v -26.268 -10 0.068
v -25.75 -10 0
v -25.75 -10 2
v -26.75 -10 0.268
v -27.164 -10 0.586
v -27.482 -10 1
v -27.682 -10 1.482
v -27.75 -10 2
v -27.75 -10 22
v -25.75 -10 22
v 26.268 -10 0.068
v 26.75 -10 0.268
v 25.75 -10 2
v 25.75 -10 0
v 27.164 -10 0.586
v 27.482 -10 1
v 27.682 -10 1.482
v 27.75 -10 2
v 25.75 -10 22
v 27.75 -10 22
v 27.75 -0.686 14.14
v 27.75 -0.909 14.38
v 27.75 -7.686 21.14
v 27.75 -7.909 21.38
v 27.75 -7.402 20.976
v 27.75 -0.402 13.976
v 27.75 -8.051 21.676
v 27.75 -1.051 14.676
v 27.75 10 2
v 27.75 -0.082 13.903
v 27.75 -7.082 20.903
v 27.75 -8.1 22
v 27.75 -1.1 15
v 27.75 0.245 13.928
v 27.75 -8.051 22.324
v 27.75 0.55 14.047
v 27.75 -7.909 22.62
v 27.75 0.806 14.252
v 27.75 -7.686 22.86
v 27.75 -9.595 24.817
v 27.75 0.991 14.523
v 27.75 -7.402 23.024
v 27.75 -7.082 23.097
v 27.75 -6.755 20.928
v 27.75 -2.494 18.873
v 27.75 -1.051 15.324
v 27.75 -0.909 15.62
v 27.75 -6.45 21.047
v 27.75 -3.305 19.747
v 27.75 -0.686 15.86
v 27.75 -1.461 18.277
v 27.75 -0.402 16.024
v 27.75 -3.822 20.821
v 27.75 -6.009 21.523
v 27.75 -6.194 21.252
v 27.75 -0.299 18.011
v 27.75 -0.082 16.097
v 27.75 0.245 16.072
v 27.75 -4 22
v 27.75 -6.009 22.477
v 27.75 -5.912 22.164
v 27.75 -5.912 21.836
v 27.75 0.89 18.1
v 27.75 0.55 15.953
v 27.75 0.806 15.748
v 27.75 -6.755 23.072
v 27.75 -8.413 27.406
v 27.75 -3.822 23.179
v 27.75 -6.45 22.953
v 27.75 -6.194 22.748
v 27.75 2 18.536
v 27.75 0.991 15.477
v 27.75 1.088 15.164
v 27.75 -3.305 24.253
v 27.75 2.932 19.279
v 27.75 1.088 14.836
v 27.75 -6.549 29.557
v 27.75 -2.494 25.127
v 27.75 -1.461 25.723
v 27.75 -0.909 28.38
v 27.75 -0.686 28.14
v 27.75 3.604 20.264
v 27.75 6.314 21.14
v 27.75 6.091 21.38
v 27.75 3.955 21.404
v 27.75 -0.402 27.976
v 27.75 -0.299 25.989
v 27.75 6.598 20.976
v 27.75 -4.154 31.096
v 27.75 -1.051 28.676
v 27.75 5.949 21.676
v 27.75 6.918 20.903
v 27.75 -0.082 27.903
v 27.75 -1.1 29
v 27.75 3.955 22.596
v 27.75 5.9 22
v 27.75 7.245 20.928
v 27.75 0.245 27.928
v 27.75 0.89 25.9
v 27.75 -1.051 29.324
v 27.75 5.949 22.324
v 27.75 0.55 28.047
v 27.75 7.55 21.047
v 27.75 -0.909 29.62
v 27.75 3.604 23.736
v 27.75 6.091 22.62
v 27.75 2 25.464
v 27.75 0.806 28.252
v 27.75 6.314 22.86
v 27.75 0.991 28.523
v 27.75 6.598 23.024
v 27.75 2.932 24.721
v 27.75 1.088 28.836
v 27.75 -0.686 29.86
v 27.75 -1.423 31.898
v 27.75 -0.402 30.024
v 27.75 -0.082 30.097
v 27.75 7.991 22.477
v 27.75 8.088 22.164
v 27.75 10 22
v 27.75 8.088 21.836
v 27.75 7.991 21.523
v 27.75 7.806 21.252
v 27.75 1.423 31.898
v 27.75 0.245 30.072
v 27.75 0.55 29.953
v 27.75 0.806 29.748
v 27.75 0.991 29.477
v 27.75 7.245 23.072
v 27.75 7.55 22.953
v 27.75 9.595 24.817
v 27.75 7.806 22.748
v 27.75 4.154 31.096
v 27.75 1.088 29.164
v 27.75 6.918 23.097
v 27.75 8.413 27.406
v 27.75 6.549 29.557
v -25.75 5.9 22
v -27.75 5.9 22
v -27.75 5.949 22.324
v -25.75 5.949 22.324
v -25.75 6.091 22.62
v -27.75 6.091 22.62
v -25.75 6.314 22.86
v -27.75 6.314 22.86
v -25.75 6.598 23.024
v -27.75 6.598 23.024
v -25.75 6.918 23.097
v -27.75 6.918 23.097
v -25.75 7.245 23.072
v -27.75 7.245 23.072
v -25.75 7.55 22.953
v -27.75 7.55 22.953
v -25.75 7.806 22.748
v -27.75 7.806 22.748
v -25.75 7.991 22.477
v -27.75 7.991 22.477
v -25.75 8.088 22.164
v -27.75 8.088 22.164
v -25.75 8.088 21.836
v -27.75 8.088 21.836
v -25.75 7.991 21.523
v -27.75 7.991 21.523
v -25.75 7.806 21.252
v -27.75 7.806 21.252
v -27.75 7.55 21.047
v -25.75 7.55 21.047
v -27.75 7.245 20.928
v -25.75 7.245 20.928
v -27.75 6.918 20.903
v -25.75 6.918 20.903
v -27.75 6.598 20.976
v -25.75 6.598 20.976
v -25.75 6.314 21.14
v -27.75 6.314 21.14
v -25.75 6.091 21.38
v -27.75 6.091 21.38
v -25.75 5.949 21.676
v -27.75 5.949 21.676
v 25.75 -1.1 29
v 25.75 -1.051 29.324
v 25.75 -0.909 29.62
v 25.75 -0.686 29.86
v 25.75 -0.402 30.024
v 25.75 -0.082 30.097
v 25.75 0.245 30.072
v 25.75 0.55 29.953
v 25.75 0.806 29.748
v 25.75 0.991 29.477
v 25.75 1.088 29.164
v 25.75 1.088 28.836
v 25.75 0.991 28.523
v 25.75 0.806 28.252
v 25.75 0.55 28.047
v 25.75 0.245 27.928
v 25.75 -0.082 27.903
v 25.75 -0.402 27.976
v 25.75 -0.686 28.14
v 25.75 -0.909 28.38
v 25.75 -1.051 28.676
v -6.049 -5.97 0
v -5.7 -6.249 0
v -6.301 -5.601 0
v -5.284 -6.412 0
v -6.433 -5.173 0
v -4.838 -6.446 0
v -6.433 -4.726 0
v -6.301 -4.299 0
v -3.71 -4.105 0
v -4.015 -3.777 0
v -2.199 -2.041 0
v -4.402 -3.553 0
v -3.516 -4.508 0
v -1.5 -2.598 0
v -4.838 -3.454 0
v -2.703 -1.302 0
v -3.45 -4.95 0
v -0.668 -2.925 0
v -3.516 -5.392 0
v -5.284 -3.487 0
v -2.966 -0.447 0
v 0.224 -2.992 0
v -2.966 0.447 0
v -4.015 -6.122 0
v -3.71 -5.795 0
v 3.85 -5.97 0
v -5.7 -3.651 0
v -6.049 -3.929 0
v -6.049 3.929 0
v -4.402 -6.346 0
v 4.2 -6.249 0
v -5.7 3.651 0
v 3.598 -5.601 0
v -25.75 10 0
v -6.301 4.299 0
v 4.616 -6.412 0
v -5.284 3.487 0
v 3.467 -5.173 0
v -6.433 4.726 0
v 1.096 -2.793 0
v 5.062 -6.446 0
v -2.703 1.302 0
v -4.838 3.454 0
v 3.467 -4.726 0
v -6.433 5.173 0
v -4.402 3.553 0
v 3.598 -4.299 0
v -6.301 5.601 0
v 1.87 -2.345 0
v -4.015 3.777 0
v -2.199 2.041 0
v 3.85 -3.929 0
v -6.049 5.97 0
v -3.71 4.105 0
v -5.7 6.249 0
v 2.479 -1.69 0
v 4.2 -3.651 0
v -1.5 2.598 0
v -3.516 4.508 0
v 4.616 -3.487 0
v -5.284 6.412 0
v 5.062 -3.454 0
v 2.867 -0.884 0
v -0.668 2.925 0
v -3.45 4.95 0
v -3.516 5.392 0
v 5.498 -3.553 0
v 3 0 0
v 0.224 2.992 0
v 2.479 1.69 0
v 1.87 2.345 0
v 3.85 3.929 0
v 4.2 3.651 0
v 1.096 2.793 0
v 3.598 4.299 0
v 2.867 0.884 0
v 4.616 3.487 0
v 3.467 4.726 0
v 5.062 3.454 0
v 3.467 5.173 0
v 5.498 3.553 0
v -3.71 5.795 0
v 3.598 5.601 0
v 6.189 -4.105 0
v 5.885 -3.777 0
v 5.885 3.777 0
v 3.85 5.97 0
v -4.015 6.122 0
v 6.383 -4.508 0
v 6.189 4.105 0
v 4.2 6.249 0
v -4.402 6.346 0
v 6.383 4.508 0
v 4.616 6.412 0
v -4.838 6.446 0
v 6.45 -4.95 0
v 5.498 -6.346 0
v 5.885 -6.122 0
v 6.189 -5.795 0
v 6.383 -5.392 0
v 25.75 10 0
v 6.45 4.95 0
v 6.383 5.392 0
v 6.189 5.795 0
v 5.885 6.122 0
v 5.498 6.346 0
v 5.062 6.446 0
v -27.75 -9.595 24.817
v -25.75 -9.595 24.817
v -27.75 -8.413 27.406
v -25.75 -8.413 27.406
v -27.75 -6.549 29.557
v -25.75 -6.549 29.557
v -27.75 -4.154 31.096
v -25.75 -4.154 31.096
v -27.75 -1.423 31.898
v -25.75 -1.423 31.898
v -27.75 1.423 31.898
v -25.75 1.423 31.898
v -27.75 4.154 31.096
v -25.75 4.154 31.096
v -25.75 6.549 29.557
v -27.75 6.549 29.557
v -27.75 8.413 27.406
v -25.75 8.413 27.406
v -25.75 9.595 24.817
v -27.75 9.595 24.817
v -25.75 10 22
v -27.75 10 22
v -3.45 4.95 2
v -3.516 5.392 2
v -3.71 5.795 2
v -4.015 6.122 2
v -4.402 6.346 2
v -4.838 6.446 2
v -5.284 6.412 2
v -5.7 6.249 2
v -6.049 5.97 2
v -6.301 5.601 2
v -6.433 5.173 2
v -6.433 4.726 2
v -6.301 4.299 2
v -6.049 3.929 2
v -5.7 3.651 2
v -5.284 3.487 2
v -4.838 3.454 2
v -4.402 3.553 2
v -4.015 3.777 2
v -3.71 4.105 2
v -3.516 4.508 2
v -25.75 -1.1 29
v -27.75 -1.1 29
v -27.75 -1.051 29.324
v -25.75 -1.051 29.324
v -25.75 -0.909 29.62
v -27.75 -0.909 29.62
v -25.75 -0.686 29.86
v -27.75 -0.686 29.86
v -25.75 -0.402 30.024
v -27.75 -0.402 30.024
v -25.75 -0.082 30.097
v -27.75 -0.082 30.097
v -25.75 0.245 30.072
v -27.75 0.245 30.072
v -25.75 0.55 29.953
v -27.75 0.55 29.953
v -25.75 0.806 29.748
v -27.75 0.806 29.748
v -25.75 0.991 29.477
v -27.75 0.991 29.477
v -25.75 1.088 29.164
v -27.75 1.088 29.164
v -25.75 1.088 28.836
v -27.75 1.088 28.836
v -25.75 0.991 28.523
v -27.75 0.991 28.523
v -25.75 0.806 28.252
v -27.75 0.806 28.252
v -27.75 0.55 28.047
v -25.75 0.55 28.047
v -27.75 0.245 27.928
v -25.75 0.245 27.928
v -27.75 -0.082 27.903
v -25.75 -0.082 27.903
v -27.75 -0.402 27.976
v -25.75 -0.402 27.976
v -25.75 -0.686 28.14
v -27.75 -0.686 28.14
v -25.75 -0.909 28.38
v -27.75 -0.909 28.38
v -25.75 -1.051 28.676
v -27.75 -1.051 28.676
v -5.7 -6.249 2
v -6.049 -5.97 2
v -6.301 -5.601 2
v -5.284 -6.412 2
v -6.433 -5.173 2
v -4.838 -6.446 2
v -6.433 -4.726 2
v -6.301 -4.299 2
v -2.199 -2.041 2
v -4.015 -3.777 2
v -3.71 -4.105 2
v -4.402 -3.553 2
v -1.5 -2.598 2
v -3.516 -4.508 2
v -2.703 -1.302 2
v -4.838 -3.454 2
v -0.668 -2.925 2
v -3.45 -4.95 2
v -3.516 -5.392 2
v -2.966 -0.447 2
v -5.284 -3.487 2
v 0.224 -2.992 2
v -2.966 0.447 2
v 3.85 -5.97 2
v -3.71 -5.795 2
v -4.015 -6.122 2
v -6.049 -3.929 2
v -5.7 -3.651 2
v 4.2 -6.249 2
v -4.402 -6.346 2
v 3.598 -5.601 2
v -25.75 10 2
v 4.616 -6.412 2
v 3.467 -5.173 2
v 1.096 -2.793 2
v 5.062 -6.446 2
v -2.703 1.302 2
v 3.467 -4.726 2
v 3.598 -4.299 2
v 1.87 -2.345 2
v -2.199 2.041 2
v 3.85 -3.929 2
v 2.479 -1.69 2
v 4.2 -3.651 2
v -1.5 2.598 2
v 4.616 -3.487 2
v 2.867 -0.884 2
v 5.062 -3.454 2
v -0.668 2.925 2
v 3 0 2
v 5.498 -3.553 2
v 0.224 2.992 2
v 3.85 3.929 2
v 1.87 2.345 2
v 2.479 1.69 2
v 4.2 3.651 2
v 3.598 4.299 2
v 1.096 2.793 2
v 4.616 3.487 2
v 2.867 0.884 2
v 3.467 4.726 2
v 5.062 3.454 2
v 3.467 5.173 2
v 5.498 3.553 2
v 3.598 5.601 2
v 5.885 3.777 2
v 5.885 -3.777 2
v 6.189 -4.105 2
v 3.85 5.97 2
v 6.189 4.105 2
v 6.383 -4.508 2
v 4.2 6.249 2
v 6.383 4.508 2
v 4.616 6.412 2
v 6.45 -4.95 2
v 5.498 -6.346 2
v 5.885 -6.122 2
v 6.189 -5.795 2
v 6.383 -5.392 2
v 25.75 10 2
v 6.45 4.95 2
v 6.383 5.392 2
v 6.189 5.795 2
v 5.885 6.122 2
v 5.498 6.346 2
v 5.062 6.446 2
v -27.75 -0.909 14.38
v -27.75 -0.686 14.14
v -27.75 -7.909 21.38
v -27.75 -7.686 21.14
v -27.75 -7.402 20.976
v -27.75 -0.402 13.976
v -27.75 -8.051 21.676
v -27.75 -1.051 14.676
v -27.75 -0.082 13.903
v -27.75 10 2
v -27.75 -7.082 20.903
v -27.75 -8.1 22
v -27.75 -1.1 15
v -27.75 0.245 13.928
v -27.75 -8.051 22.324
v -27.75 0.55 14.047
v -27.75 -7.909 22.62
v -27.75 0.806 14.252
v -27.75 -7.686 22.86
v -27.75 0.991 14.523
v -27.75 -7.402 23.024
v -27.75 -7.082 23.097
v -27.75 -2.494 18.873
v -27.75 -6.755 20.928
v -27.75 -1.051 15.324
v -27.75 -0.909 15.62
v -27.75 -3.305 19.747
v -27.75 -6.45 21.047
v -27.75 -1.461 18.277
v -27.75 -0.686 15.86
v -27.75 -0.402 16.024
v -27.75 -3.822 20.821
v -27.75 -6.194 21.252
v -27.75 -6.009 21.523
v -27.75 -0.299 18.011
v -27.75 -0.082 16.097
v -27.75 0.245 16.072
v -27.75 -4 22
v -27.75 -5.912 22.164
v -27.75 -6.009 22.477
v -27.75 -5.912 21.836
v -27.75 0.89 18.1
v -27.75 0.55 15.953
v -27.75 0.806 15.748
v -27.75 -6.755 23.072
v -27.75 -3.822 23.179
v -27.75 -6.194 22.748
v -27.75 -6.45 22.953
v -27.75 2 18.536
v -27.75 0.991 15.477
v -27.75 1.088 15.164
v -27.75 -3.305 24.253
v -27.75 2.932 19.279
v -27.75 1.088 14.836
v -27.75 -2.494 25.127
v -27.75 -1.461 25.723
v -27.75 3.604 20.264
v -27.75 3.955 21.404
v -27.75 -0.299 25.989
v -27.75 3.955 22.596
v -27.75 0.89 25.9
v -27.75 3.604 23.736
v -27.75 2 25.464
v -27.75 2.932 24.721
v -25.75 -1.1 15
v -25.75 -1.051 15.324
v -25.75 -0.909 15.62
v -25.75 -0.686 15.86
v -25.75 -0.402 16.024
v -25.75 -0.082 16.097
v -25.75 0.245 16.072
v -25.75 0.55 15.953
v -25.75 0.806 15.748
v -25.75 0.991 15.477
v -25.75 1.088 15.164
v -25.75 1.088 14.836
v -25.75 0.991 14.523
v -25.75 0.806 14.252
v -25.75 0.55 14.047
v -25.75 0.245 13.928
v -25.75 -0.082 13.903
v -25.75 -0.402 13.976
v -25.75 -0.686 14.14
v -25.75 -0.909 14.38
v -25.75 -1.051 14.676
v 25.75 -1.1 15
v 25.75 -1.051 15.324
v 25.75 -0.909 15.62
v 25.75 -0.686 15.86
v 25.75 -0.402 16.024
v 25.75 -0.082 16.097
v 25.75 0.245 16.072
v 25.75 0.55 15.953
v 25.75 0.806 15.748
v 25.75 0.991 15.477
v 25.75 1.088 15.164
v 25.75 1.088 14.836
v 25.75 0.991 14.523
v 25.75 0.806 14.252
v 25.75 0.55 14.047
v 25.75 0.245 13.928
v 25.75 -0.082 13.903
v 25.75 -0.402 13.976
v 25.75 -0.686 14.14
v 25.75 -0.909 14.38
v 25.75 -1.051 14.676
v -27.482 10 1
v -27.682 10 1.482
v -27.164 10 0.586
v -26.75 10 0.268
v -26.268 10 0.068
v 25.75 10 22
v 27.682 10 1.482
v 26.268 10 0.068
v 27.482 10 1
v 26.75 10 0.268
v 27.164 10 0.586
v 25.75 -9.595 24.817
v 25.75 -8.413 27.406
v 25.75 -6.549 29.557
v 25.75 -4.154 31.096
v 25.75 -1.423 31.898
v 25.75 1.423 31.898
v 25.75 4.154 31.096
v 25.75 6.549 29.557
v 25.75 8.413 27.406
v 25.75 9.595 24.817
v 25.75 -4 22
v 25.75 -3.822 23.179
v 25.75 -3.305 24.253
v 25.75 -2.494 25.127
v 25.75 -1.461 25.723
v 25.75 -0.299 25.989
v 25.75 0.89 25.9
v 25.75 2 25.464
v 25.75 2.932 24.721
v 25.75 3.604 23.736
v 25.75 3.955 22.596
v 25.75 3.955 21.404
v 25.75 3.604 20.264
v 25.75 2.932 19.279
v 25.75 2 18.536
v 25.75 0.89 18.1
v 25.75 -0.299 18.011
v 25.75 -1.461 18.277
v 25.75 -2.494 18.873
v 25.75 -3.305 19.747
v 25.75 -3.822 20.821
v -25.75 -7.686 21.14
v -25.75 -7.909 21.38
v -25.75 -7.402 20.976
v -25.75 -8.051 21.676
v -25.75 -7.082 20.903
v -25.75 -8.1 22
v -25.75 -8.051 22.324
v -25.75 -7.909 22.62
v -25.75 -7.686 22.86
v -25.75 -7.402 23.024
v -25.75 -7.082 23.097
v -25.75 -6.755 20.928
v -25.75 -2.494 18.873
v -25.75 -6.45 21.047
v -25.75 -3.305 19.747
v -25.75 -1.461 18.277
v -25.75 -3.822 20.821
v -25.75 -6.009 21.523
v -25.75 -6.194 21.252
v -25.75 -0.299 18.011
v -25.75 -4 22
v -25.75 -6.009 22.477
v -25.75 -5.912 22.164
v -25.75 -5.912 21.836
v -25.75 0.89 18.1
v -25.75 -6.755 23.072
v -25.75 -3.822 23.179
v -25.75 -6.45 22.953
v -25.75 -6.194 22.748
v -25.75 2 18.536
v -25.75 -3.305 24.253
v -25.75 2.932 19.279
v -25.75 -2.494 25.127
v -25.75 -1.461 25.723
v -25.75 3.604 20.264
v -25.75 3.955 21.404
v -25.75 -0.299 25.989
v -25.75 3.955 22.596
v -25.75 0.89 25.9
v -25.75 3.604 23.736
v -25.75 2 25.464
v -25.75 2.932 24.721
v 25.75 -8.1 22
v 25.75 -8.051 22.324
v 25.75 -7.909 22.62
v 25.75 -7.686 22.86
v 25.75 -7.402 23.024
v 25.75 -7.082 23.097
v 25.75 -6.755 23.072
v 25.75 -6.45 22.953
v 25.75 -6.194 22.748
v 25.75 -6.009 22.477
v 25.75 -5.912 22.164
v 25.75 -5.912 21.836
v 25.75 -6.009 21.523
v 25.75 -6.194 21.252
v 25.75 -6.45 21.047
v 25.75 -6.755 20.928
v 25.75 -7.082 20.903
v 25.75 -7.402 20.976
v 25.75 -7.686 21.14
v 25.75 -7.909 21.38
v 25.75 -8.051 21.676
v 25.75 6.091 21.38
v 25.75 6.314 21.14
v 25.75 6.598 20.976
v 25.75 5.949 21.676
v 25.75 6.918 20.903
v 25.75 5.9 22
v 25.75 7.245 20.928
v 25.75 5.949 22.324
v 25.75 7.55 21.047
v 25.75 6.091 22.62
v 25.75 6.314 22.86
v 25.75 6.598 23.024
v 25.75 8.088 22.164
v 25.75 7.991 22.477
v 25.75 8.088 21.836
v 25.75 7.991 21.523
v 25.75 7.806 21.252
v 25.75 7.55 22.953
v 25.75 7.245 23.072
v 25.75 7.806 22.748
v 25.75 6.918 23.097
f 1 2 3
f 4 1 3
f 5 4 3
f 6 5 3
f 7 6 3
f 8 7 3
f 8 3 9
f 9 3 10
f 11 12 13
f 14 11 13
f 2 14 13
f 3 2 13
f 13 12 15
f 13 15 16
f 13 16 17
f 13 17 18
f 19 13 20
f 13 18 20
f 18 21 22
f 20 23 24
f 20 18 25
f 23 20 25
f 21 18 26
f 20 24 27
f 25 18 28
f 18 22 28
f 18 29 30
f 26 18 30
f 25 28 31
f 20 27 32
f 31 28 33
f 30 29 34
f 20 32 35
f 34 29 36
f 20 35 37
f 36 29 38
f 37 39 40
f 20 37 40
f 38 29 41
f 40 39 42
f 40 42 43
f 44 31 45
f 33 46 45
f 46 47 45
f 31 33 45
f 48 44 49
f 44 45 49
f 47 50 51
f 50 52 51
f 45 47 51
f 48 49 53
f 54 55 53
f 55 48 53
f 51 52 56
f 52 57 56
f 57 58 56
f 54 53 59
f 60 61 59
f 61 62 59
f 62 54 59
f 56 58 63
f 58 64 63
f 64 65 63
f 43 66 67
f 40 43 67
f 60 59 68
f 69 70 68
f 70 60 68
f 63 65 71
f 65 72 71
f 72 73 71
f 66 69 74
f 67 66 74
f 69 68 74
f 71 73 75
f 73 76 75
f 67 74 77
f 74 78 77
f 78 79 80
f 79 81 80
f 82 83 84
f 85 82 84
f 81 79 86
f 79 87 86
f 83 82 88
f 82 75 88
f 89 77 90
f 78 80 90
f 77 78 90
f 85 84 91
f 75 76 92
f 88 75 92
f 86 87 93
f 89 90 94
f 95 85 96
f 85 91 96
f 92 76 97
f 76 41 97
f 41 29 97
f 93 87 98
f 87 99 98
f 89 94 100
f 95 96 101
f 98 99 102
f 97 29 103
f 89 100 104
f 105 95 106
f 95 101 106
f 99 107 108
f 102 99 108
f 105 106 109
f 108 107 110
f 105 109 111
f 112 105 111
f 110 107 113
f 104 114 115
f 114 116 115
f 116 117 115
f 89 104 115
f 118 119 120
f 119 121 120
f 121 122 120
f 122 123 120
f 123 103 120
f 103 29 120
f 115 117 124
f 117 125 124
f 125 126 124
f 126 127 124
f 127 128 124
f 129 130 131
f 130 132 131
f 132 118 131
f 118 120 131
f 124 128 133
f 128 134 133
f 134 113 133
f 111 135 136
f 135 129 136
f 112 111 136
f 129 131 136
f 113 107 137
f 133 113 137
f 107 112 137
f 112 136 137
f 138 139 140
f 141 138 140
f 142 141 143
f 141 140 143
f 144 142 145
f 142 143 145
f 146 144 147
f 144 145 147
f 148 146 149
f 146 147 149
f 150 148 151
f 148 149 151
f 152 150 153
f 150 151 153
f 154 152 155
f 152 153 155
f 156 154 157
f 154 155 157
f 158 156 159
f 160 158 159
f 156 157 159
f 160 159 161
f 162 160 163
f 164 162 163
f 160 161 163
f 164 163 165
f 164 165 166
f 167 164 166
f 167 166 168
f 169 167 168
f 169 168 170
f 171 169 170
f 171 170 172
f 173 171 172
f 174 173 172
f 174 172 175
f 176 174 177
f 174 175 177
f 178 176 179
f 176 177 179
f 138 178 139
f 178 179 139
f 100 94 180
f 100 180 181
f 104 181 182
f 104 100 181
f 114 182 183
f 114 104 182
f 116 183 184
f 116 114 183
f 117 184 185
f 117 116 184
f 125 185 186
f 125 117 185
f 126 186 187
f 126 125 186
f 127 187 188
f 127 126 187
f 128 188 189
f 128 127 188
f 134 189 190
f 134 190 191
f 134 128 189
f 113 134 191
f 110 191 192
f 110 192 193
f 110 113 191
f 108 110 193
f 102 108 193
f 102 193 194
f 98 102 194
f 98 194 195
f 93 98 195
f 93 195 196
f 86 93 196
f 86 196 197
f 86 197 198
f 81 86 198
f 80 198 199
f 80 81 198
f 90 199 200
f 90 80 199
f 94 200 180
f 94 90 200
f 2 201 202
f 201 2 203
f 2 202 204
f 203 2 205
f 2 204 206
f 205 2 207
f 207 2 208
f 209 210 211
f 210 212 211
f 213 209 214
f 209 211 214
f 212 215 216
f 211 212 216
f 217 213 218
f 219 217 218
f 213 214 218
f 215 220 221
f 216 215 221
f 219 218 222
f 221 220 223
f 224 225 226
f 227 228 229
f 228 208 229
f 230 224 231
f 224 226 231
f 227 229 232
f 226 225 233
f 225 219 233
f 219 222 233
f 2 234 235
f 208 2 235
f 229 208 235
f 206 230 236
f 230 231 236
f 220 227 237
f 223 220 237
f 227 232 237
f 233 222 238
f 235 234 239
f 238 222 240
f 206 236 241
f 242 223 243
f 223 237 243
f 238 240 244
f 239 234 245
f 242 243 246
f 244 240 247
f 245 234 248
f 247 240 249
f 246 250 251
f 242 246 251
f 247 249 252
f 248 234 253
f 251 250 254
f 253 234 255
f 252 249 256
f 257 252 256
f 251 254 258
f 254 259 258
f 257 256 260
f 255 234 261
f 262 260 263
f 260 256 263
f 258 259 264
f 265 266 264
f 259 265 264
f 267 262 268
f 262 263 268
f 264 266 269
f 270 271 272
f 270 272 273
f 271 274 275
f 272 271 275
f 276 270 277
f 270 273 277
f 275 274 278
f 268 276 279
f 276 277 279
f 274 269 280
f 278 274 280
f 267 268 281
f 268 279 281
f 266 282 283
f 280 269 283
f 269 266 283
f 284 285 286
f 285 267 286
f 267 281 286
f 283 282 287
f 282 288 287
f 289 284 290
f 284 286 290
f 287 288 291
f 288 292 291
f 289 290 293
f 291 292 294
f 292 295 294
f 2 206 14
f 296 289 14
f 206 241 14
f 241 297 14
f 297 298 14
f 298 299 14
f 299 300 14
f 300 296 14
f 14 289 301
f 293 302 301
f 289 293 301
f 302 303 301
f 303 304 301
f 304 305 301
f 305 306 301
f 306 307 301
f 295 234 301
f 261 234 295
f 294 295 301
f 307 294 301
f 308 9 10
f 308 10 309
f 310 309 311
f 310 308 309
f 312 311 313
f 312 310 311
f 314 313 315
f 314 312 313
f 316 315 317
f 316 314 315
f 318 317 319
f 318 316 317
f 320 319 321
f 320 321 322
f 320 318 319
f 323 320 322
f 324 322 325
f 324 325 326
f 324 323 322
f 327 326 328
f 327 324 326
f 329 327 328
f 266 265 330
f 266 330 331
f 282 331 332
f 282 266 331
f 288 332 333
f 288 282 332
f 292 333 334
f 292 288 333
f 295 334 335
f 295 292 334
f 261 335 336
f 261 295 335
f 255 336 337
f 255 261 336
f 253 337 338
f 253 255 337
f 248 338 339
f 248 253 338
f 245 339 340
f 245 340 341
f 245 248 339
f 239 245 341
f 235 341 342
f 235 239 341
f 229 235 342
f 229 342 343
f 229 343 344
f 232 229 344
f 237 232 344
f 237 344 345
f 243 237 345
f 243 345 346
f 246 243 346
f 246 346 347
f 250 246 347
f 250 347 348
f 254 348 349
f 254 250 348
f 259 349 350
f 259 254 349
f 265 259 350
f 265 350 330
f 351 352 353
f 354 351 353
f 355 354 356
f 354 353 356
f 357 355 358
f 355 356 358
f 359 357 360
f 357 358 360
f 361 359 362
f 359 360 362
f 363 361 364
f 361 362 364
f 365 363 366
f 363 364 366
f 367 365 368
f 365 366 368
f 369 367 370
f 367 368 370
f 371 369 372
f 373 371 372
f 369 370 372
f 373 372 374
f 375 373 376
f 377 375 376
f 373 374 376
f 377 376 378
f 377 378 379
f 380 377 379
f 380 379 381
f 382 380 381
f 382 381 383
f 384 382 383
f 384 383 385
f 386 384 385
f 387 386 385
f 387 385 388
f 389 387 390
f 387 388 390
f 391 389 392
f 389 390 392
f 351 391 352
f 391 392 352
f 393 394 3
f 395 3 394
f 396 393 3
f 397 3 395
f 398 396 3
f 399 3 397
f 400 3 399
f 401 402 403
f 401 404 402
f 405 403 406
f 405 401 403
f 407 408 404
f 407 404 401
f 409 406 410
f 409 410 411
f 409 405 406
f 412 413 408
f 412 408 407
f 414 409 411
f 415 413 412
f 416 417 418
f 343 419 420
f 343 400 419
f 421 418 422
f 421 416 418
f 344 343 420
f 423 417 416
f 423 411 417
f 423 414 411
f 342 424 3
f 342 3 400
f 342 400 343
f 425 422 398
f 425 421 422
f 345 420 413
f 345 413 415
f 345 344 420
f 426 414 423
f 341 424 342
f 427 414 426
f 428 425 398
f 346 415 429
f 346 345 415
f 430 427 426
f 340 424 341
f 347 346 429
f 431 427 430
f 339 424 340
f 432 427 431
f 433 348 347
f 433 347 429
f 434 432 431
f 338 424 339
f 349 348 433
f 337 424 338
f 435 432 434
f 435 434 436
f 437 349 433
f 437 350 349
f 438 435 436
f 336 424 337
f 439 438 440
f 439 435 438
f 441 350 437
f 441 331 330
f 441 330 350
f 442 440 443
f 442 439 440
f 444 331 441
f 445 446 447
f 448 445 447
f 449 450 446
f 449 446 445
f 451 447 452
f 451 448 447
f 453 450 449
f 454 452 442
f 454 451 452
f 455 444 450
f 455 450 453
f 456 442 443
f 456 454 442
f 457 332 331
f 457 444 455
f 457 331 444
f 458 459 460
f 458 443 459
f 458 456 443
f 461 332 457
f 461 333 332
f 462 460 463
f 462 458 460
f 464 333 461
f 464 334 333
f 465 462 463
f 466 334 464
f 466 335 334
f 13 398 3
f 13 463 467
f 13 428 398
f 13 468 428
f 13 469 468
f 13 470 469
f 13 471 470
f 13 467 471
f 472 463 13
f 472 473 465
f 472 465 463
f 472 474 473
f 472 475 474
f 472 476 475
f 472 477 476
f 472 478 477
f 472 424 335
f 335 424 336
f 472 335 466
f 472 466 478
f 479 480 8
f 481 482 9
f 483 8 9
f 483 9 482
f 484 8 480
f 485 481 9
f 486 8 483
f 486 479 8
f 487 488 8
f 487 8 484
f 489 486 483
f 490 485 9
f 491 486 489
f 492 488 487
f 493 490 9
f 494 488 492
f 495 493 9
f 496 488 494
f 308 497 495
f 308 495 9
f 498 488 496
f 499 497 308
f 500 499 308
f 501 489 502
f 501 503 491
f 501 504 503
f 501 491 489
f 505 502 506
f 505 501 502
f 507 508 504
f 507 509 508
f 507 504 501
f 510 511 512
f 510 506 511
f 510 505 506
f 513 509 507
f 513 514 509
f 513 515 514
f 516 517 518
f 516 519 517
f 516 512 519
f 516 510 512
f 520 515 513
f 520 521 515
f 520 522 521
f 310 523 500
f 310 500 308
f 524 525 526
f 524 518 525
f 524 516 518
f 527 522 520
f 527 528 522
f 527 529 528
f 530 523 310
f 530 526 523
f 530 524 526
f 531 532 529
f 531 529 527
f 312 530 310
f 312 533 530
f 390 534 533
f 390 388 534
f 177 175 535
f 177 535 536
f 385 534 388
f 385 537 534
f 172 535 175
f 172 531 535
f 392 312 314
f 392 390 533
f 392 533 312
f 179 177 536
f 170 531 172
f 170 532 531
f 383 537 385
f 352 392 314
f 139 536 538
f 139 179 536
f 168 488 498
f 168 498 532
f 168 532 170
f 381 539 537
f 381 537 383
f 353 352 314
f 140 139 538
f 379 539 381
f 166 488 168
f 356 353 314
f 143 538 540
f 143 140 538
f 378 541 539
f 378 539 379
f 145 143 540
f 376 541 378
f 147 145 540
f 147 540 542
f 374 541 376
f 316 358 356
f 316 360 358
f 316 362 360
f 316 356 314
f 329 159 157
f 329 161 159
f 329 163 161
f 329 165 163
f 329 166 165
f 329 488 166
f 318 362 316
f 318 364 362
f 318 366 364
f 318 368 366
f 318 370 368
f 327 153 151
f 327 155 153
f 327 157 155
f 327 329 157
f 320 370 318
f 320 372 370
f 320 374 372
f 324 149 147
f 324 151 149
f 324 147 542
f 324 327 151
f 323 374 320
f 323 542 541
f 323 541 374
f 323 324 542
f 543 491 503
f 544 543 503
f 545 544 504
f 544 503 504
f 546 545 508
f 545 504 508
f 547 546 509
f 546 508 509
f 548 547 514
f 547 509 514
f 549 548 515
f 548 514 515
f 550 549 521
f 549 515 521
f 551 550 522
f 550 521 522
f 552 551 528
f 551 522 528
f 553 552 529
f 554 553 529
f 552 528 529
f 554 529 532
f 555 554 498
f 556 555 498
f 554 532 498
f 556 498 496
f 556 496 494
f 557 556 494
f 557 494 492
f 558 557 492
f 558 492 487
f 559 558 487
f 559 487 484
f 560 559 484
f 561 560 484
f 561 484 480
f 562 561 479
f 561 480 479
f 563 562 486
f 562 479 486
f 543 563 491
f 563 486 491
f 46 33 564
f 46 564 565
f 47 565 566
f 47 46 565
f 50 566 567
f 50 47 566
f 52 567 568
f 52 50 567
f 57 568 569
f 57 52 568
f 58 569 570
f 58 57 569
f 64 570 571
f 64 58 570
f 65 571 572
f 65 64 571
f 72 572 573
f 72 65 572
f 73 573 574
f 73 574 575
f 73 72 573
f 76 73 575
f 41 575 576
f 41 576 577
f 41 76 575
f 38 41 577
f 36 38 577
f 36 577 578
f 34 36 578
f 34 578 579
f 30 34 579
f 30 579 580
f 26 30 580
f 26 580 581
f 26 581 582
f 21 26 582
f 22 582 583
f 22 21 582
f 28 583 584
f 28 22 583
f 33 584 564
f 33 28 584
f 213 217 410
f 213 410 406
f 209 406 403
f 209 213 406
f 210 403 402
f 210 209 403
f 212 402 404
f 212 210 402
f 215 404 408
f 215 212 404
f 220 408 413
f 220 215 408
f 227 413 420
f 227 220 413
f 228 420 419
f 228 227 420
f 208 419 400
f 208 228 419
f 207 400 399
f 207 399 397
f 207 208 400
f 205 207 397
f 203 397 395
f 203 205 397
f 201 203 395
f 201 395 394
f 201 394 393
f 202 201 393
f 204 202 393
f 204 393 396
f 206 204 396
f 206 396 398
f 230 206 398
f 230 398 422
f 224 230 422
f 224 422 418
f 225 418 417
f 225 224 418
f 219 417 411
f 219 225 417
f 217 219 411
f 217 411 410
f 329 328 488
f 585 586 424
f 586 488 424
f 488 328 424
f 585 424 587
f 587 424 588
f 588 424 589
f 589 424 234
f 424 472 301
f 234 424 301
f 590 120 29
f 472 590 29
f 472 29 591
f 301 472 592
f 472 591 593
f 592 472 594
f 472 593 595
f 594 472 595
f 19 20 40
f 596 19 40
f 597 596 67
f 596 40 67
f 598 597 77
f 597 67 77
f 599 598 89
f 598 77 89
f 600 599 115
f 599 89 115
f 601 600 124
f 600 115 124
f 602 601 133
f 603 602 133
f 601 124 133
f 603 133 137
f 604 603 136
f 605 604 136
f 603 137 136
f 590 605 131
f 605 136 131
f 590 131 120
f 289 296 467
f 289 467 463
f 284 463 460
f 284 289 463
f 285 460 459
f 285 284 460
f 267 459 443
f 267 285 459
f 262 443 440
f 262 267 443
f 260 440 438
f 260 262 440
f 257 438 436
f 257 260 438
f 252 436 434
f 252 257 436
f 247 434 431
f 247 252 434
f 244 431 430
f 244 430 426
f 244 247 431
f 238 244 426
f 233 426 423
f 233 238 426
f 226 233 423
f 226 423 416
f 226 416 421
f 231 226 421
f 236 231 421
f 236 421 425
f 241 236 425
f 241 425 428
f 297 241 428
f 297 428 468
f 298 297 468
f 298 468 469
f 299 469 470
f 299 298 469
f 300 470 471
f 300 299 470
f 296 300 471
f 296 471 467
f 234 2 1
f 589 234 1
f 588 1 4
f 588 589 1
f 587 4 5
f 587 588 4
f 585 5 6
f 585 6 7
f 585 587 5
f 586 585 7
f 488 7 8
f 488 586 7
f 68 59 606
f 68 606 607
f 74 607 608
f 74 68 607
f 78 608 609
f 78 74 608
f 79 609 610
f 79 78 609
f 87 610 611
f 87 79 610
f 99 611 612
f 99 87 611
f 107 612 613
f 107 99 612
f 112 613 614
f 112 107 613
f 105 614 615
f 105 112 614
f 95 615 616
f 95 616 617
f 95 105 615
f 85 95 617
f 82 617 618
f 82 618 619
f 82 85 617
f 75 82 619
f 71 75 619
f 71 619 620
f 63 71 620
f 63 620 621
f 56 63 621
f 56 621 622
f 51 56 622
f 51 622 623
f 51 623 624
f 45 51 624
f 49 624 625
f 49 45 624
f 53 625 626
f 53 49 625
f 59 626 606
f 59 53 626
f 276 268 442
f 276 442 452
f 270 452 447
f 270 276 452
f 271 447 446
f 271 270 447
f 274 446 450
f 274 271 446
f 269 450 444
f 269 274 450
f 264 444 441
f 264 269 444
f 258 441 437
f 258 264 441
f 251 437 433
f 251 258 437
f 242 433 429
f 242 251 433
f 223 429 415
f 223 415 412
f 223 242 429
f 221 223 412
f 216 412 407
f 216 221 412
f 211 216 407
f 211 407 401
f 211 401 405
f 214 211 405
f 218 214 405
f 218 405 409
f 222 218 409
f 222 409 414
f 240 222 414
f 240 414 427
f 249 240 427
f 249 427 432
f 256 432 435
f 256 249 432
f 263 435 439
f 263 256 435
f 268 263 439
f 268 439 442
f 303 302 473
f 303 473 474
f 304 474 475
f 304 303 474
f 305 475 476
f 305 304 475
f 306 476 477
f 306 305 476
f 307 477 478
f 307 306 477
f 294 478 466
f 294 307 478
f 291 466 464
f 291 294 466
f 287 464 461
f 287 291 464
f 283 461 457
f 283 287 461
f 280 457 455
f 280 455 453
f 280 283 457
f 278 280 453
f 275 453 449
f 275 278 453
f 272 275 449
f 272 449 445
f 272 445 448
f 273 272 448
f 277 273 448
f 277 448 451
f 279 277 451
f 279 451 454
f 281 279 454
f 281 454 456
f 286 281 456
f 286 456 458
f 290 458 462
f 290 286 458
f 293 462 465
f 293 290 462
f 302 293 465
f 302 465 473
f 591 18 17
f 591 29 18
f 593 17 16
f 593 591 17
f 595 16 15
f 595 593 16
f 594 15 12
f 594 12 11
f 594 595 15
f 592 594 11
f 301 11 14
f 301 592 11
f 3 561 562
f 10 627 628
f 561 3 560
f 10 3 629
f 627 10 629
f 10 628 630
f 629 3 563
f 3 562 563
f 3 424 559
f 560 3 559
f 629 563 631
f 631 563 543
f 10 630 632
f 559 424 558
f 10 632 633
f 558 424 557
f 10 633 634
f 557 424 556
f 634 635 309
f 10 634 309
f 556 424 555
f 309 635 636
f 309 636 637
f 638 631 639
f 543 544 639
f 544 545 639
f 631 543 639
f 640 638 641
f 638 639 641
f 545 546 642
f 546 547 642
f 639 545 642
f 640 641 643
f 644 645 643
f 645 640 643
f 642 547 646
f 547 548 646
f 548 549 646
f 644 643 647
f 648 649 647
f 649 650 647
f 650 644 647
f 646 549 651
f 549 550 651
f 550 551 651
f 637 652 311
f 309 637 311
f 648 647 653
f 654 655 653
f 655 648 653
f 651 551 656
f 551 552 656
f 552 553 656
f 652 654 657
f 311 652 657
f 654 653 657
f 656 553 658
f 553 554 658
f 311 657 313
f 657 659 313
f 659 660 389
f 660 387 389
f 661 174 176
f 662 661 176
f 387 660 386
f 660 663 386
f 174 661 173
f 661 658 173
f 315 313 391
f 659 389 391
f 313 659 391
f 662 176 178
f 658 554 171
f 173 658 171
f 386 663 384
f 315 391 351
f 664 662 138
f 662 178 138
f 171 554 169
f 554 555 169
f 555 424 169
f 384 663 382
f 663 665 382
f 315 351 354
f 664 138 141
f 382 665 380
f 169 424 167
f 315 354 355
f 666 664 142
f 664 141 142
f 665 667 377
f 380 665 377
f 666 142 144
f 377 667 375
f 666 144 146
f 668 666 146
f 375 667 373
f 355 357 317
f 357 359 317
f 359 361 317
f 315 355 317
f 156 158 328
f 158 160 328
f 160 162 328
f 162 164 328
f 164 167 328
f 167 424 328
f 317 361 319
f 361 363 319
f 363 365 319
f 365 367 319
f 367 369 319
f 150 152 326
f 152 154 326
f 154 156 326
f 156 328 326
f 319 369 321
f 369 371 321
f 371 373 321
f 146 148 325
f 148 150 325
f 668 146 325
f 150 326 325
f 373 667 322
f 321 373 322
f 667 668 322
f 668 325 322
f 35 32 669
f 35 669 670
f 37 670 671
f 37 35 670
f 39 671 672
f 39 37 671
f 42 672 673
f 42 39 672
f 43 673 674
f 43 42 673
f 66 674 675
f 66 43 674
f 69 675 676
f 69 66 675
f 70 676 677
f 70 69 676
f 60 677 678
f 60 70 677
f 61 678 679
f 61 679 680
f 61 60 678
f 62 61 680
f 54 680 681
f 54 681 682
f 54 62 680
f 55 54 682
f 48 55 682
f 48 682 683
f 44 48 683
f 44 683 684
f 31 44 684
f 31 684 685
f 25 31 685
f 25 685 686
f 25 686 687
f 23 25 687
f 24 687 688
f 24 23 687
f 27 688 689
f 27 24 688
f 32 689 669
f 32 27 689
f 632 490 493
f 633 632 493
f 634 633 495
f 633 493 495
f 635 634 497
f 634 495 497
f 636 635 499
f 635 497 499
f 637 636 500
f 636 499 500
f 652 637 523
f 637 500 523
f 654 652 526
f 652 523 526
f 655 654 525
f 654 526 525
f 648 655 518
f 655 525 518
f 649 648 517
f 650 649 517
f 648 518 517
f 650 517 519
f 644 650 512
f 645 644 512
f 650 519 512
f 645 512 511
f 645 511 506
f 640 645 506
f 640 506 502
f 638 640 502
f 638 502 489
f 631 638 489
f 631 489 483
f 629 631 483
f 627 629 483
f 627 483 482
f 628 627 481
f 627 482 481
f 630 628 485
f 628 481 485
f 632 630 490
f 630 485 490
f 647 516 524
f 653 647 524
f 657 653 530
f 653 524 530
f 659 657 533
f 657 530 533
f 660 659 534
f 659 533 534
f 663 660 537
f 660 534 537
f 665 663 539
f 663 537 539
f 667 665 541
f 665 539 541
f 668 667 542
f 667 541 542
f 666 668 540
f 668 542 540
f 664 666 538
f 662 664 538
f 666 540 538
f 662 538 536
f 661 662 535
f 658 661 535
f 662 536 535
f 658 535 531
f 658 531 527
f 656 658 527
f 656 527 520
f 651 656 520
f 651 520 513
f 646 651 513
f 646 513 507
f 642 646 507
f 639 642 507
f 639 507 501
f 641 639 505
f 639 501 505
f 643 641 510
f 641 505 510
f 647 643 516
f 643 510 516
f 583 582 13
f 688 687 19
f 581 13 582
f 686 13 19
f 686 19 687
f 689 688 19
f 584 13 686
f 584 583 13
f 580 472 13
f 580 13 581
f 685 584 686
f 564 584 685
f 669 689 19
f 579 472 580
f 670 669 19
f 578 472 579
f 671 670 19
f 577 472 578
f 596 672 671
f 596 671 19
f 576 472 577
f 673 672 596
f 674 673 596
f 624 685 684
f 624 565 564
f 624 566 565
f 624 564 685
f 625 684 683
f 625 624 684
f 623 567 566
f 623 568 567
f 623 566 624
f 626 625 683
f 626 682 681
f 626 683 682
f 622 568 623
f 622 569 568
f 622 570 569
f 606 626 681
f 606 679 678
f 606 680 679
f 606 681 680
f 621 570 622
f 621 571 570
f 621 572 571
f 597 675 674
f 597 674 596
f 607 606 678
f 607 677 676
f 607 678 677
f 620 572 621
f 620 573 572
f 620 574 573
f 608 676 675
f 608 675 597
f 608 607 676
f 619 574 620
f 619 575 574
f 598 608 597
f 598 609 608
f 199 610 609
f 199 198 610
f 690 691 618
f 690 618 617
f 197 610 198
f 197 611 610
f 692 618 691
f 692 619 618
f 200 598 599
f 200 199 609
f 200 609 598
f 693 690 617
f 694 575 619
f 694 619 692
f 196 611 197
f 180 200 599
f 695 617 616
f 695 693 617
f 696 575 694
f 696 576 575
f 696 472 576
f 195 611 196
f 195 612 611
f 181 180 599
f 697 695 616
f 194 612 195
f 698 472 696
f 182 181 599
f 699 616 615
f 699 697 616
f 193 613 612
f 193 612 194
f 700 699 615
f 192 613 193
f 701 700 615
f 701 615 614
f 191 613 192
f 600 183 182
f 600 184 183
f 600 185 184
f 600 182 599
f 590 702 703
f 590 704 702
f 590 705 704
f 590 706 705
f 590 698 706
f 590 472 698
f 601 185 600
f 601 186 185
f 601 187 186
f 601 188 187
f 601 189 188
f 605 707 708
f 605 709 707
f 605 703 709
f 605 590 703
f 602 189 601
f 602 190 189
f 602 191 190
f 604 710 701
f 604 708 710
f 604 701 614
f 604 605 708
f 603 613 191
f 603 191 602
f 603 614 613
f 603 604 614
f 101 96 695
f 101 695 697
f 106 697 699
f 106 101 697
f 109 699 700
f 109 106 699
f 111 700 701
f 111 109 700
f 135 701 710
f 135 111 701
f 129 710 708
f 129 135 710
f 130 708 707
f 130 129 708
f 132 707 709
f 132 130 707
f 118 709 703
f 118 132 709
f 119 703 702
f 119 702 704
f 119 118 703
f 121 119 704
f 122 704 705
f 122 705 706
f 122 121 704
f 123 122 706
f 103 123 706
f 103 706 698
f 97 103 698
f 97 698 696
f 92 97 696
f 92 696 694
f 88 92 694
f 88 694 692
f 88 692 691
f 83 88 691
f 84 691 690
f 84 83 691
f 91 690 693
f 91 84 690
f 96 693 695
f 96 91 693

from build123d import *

# Parameters (mm, degrees)
SKETCH_1_W      = 55.5
SKETCH_1_H      = 20
SKETCH_1_R      = 3
SKETCH_1_R_2    = 1.5
EXTRUDE_1_DEPTH = 2
SKETCH_2_R      = 4
SKETCH_2_R_2    = 1.1
EXTRUDE_2_DEPTH = 2
FILLET_1_R      = 2


with BuildPart() as part:
    # 草图1 → 凸台-拉伸1 (new body)
    with BuildSketch(Plane.XY):
        Rectangle(SKETCH_1_W, SKETCH_1_H)
        Circle(SKETCH_1_R, mode=Mode.SUBTRACT)
        with Locations((-4.949747468, 4.949747468)):
            Circle(SKETCH_1_R_2, mode=Mode.SUBTRACT)
        with Locations((4.949747468, 4.949747468)):
            Circle(SKETCH_1_R_2, mode=Mode.SUBTRACT)
        with Locations((4.949747468, -4.949747468)):
            Circle(SKETCH_1_R_2, mode=Mode.SUBTRACT)
        with Locations((-4.949747468, -4.949747468)):
            Circle(SKETCH_1_R_2, mode=Mode.SUBTRACT)
    extrude(amount=EXTRUDE_1_DEPTH)

    # 草图2 → 凸台-拉伸2 (add)
    with BuildSketch(Plane.ZY.offset(27.75)):
        with BuildLine():
            Line((2, 10), (2, -10))
            Line((2, -10), (22, -10))
            ThreePointArc((22, -10), (32, 0), (22, 10))
            Line((22, 10), (2, 10))
        make_face()
        with Locations(Location((22, 0, 0), (0, 0, 270))):
            Circle(SKETCH_2_R, mode=Mode.SUBTRACT)
        with Locations(Location((29, 0, 0), (0, 0, 270))):
            Circle(SKETCH_2_R_2, mode=Mode.SUBTRACT)
        with Locations(Location((22, -7, 0), (0, 0, 270))):
            Circle(SKETCH_2_R_2, mode=Mode.SUBTRACT)
        with Locations(Location((15, 0, 0), (0, 0, 270))):
            Circle(SKETCH_2_R_2, mode=Mode.SUBTRACT)
        with Locations(Location((22, 7, 0), (0, 0, 270))):
            Circle(SKETCH_2_R_2, mode=Mode.SUBTRACT)
    extrude_2 = extrude(amount=-EXTRUDE_2_DEPTH)

    # 镜向1: 凸台-拉伸2 across plane
    add(extrude_2.mirror(Plane(origin=(0, 0, 0), x_dir=(0, 0, 1), z_dir=(1, 0, 0))))

    # 圆角1
    fillet_1_edges = [part.edges().sort_by_distance(p)[0] for p in [
        (-27.75, 0, 0),
        (27.75, 0, 0),
    ]]
    fillet(fillet_1_edges, radius=FILLET_1_R)


solid = part.part
